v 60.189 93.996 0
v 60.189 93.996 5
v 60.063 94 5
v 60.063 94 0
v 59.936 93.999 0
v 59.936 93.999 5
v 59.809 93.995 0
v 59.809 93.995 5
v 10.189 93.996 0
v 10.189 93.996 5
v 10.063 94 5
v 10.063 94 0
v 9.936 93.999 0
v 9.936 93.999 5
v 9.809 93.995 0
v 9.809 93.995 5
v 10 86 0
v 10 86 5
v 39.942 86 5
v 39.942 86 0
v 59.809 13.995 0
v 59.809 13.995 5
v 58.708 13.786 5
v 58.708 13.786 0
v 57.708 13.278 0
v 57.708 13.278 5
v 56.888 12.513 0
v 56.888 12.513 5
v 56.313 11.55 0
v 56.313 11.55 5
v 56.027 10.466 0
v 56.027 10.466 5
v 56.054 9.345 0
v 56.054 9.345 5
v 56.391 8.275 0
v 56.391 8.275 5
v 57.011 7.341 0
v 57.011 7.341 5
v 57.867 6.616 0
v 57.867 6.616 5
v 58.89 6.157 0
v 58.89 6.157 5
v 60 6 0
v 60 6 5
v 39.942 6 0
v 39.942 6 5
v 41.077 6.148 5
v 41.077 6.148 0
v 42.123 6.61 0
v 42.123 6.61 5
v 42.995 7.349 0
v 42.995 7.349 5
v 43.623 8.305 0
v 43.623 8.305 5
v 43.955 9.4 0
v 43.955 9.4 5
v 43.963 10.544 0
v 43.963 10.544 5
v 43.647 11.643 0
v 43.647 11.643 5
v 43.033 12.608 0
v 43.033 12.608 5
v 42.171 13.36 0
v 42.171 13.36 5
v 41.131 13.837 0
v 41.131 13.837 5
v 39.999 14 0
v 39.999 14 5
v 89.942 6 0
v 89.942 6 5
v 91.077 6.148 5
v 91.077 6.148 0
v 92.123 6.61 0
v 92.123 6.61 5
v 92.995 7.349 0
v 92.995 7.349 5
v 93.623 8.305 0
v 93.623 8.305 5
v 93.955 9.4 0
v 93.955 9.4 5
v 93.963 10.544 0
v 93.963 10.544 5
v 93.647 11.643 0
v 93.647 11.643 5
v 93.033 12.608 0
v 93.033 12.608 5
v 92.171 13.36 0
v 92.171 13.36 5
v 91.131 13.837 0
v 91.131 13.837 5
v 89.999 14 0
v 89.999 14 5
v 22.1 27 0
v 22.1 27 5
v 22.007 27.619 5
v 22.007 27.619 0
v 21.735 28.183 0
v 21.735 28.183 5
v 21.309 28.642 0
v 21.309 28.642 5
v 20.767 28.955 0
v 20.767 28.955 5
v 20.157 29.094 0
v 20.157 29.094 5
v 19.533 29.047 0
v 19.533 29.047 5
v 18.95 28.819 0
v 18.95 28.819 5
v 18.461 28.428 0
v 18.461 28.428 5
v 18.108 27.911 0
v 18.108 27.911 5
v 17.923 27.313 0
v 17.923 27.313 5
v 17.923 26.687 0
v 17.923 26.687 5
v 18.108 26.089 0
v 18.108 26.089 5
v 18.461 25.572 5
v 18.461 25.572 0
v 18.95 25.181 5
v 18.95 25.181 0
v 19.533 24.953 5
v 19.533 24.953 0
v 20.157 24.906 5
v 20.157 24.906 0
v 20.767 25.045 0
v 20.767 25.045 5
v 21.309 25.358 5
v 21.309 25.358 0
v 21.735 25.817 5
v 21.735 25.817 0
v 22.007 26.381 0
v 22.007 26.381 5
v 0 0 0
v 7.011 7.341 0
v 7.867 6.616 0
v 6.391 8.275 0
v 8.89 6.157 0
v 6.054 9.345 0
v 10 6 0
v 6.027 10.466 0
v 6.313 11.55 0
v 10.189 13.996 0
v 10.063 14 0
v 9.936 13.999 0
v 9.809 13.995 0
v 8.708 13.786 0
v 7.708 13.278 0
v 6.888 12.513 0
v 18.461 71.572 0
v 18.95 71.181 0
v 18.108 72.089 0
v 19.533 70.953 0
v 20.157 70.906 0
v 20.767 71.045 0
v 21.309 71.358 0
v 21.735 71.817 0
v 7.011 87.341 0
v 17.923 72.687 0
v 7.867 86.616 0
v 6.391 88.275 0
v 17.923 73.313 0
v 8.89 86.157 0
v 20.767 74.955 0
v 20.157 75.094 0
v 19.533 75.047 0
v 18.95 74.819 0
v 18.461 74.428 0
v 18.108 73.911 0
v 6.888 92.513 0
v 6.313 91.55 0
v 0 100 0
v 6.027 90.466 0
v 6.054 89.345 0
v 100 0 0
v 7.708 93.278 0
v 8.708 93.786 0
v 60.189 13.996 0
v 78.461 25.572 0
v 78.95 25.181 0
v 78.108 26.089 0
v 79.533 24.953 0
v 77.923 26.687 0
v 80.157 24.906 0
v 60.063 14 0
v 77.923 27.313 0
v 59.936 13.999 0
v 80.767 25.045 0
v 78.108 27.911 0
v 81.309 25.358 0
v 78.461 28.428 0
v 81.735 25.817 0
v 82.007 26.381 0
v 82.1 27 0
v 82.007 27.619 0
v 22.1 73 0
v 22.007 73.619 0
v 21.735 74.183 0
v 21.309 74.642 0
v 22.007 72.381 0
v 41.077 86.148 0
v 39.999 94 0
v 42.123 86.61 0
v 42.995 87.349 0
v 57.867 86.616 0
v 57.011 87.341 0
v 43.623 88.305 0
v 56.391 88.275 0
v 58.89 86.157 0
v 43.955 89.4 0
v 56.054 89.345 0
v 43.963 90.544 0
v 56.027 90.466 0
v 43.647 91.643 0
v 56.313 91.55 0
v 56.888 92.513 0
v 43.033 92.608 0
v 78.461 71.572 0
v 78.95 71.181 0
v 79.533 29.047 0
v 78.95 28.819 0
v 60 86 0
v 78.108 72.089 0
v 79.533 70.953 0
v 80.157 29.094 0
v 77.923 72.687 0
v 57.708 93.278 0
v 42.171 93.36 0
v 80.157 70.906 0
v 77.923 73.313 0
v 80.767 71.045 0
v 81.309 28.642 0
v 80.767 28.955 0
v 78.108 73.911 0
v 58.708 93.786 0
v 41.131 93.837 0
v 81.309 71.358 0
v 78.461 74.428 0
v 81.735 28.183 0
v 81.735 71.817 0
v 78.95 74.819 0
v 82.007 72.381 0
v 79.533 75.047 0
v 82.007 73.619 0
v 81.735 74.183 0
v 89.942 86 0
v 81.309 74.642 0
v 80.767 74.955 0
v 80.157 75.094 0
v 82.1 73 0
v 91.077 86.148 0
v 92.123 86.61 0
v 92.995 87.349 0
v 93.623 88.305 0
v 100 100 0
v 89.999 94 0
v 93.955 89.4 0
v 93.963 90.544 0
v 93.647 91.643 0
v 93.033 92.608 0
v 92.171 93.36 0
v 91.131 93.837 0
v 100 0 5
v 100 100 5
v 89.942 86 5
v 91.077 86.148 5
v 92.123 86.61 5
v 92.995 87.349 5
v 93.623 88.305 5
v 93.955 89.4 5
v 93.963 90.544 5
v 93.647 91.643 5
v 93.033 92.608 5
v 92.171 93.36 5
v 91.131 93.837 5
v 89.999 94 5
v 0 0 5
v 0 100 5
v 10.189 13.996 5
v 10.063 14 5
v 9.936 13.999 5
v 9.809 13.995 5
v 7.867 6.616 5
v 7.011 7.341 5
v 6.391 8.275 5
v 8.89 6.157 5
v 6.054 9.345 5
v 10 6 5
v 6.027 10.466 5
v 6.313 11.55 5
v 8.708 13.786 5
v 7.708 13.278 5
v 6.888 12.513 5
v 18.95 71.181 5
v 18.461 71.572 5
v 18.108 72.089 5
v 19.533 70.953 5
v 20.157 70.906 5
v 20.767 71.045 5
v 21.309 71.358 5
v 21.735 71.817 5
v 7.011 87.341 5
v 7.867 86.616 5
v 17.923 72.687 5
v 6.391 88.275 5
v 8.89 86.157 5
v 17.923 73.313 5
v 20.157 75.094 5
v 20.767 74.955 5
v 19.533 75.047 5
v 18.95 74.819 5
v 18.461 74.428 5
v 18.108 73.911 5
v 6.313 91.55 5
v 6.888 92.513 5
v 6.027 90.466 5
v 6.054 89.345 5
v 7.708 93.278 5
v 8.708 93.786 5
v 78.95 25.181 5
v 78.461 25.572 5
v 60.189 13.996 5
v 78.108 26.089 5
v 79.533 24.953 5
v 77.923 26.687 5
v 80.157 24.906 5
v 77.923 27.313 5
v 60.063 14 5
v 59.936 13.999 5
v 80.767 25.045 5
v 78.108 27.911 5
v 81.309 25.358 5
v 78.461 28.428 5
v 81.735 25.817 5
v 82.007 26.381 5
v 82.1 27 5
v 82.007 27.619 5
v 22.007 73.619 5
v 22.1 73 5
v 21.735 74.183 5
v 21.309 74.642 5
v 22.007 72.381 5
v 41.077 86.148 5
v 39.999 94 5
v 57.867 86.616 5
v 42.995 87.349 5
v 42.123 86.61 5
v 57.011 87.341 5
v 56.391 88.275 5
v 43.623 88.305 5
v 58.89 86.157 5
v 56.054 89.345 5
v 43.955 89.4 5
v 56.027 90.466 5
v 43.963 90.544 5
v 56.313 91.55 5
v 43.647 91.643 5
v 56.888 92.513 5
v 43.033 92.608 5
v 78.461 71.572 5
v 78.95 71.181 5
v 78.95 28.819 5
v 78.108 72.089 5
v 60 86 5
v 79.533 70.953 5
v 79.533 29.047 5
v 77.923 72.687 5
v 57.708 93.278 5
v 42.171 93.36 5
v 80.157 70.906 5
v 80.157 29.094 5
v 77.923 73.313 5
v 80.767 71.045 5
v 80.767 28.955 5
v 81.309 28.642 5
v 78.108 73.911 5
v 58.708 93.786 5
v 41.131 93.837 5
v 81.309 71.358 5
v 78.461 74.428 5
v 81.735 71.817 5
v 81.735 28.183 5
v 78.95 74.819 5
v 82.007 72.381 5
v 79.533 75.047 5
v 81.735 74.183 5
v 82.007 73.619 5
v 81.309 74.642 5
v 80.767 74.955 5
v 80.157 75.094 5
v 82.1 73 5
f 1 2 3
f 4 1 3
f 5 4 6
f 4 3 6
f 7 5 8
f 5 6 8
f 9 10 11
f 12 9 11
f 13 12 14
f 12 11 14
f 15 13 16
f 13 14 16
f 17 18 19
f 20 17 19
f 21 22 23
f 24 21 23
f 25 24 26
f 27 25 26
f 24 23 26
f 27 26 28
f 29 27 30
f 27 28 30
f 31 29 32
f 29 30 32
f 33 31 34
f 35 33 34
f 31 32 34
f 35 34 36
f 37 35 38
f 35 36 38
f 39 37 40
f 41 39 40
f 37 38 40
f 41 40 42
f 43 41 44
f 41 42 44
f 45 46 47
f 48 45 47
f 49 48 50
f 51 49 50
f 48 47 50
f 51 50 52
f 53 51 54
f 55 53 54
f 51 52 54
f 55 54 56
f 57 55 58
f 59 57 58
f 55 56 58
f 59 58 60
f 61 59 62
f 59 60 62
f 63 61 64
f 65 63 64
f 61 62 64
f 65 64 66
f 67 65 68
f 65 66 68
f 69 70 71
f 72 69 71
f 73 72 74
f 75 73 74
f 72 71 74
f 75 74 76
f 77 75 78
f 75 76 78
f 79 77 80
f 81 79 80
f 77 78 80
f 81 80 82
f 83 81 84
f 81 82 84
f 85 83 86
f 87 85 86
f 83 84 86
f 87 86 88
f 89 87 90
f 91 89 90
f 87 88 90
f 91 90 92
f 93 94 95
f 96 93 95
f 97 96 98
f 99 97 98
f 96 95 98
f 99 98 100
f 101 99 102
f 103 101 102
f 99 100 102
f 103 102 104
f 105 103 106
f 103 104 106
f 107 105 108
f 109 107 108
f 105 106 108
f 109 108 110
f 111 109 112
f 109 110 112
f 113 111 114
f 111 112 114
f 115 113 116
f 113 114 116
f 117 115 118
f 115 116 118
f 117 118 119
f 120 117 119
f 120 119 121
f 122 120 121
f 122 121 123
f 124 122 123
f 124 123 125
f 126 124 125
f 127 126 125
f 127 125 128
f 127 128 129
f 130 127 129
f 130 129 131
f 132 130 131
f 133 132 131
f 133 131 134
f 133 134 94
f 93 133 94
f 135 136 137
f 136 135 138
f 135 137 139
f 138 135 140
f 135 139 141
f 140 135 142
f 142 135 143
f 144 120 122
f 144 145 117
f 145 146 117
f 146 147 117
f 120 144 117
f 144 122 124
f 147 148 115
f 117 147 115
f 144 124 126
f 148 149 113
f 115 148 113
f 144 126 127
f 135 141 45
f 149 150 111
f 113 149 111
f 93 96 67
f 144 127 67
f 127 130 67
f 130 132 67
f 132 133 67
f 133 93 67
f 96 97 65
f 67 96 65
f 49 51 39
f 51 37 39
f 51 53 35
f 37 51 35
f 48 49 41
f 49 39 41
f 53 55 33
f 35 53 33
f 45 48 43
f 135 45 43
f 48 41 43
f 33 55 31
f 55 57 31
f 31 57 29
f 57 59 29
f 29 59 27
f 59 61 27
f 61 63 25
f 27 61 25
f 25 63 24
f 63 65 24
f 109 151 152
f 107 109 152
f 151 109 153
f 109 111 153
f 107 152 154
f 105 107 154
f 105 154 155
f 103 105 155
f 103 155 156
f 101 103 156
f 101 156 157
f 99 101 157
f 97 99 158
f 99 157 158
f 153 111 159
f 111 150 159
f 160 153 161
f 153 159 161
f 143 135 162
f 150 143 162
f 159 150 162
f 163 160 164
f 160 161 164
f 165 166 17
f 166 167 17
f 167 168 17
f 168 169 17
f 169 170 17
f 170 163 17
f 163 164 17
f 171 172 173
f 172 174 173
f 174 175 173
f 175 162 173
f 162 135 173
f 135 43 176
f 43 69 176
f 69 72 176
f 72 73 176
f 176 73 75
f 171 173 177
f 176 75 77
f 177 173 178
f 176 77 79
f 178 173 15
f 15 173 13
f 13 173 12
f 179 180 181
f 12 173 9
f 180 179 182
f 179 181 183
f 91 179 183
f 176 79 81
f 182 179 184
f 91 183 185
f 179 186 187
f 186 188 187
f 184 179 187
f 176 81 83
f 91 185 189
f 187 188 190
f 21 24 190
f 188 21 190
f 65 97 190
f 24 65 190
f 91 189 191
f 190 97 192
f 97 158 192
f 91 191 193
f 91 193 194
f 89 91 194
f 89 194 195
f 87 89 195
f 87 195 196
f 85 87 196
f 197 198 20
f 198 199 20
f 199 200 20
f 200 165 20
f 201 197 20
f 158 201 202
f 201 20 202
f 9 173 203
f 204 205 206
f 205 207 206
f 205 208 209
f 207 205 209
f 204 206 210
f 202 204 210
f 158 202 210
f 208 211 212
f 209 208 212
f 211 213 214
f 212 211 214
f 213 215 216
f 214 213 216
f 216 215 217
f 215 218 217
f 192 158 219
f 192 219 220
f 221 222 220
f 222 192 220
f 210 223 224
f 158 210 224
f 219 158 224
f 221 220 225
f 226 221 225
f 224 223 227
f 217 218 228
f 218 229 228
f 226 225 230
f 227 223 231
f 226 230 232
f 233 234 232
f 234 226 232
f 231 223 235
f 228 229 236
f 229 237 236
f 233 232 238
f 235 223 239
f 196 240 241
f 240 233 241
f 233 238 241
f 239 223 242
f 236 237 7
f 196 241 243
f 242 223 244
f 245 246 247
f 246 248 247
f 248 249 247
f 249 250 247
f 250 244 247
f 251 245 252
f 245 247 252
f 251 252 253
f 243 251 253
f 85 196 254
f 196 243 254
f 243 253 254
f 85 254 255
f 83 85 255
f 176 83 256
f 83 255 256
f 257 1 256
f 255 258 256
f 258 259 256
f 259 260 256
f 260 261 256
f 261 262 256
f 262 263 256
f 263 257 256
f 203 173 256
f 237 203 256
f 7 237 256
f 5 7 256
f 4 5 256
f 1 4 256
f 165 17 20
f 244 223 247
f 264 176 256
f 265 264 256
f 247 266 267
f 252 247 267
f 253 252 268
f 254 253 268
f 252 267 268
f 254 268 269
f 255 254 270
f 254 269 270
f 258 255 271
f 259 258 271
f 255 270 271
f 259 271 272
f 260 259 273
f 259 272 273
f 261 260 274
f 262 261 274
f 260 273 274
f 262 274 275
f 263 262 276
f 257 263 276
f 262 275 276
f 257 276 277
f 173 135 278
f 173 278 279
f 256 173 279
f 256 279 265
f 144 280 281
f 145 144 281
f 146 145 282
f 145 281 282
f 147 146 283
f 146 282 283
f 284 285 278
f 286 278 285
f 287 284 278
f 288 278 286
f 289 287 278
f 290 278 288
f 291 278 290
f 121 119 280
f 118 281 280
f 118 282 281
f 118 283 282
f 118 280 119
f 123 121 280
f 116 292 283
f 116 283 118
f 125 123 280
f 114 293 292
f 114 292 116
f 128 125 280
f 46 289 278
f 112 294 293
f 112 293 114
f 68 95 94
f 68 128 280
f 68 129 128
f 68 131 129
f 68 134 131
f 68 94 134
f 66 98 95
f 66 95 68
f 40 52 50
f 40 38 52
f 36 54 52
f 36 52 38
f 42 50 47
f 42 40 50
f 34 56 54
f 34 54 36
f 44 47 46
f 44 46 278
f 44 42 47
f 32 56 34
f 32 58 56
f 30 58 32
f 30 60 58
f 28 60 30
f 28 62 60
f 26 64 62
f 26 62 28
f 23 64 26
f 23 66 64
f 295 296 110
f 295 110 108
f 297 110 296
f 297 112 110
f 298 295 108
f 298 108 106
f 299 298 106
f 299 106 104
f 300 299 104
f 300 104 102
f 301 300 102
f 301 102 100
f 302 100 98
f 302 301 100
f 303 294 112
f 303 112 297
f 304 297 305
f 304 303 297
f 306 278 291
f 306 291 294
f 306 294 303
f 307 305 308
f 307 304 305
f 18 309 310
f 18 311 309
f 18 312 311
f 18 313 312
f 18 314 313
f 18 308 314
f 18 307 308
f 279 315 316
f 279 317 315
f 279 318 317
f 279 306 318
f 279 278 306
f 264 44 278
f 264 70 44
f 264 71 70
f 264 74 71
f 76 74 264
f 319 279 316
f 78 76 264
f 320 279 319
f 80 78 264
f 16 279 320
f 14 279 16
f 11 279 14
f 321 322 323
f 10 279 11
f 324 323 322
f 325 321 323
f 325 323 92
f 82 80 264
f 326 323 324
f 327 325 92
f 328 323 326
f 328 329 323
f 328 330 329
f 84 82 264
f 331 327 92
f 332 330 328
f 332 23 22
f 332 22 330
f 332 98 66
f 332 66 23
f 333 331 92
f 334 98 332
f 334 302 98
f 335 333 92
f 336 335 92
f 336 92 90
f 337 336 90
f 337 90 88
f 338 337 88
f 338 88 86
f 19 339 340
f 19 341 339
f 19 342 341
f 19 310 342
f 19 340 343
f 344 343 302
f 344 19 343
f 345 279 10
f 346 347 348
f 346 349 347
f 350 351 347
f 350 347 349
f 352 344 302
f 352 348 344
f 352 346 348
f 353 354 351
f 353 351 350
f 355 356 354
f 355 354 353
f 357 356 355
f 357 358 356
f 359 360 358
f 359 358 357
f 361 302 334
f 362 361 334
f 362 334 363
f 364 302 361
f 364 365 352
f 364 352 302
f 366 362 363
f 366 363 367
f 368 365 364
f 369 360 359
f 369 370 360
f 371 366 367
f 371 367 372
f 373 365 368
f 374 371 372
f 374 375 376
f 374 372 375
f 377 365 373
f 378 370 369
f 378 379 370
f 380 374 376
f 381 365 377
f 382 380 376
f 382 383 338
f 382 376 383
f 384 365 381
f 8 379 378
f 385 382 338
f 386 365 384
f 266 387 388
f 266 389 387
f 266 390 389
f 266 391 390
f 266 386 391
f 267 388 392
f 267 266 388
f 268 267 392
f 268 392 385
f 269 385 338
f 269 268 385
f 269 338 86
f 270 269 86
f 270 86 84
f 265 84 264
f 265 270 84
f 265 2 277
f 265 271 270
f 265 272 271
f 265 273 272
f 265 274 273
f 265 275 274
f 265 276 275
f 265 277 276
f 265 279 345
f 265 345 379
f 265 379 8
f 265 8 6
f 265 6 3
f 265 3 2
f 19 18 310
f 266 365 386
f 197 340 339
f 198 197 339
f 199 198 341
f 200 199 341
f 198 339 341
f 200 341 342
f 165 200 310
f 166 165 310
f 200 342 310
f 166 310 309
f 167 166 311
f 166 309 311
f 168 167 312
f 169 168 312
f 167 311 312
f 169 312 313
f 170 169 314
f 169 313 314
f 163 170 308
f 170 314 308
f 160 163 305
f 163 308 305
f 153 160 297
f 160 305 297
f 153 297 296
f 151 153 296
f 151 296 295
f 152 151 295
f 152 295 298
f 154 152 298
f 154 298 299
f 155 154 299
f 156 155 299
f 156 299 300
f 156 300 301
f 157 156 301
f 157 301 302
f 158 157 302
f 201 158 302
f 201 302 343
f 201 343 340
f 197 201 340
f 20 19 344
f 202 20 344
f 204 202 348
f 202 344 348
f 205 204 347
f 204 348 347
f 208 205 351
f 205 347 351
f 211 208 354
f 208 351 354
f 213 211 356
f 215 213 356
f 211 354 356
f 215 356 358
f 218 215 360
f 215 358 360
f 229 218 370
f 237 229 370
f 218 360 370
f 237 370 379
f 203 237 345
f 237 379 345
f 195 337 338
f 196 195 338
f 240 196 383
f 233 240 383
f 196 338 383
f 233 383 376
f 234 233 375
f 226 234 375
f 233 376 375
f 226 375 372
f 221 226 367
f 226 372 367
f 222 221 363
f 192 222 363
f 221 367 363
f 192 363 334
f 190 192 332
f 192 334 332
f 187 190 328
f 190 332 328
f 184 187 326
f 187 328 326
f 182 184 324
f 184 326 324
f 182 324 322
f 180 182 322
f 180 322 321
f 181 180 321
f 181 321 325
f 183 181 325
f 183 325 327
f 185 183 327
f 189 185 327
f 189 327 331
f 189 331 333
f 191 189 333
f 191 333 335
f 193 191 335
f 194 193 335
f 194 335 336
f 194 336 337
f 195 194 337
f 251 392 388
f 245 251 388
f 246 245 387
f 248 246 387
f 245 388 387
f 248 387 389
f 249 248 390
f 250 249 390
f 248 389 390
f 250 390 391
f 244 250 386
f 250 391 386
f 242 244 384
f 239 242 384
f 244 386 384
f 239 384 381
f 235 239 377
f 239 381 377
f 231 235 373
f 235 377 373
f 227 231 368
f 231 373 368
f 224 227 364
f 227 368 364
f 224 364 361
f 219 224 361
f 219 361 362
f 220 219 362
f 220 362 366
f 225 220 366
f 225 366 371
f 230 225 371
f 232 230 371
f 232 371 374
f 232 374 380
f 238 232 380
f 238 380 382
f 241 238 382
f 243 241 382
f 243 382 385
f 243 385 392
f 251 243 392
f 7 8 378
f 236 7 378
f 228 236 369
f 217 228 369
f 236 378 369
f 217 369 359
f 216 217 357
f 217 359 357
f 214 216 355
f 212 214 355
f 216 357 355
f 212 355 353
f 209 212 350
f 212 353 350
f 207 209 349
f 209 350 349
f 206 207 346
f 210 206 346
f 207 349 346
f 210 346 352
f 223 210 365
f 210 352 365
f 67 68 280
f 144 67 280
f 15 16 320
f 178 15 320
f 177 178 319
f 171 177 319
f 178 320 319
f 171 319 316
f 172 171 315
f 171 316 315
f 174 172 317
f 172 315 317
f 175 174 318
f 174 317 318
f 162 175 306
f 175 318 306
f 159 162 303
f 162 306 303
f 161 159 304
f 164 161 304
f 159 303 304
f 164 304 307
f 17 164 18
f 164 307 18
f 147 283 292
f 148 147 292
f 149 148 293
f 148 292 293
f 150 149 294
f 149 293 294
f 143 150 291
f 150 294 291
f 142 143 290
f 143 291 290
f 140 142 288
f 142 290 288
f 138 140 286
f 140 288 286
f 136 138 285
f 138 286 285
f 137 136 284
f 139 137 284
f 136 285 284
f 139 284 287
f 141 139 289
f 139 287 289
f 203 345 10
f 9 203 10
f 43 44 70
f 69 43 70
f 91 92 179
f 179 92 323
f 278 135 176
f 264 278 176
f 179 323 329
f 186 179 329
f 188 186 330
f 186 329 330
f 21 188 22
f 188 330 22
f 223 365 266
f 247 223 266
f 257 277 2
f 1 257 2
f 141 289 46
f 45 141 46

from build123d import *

# Parameters (mm, degrees)
F0_W     = 100
F0_H     = 100
F1_DEPTH = 5
F3_DEPTH = 25
F4_R     = 2.1
F5_DEPTH = 25


with BuildPart() as f1:
    # F0 (on Top) → F1 (new body)
    with BuildSketch(Plane.XY):
        with Locations((50, 50)):
            Rectangle(F0_W, F0_H)
    extrude(amount=F1_DEPTH)

    # F2 (on face) → F3 (cut)
    with BuildSketch(Plane.XY.offset(5)):
        with BuildLine():
            Line((9.80931, 13.995452), (10.189486, 13.995509))
            ThreePointArc((10.189486, 13.995509), (9.999397, 14), (9.80931, 13.995452))
        make_face()
        with BuildLine():
            Line((39.999397, 14), (10.189486, 13.995509))
            Line((10.189486, 13.995509), (9.80931, 13.995452))
            ThreePointArc((9.80931, 13.995452), (6.001138, 9.9046), (10.000056, 6))
            Line((10.000056, 6), (39.942331, 6.000416))
            ThreePointArc((39.942331, 6.000416), (43.999898, 9.971466), (39.999397, 14))
        make_face()
        with BuildLine():
            Line((10.000056, 86), (39.942331, 86.000416))
            ThreePointArc((39.942331, 86.000416), (43.999898, 89.971466), (39.999397, 94))
            Line((39.999397, 94), (10.189486, 93.995509))
            Line((10.189486, 93.995509), (9.80931, 93.995452))
            ThreePointArc((9.80931, 93.995452), (6.001138, 89.9046), (10.000056, 86))
        make_face()
        with BuildLine():
            Line((9.80931, 93.995452), (10.189486, 93.995509))
            ThreePointArc((10.189486, 93.995509), (9.999397, 94), (9.80931, 93.995452))
        make_face()
        with BuildLine():
            Line((60.000056, 6), (89.942331, 6.000416))
            ThreePointArc((89.942331, 6.000416), (93.999898, 9.971466), (89.999397, 14))
            Line((89.999397, 14), (60.189486, 13.995509))
            Line((60.189486, 13.995509), (59.80931, 13.995452))
            ThreePointArc((59.80931, 13.995452), (56.001138, 9.9046), (60.000056, 6))
        make_face()
        with BuildLine():
            Line((59.80931, 13.995452), (60.189486, 13.995509))
            ThreePointArc((60.189486, 13.995509), (59.999397, 14), (59.80931, 13.995452))
        make_face()
        with BuildLine():
            Line((60.000056, 86), (89.942331, 86.000416))
            ThreePointArc((89.942331, 86.000416), (93.999898, 89.971466), (89.999397, 94))
            Line((89.999397, 94), (60.189486, 93.995509))
            Line((60.189486, 93.995509), (59.80931, 93.995452))
            ThreePointArc((59.80931, 93.995452), (56.001138, 89.9046), (60.000056, 86))
        make_face()
        with BuildLine():
            Line((59.80931, 93.995452), (60.189486, 93.995509))
            ThreePointArc((60.189486, 93.995509), (59.999397, 94), (59.80931, 93.995452))
        make_face()
    extrude(amount=-F3_DEPTH, mode=Mode.SUBTRACT)

    # F4 (on face) → F5 (cut)
    with BuildSketch(Plane.XY.offset(5)):
        with Locations((20, 73)):
            Circle(F4_R)
        with Locations((20, 27)):
            Circle(F4_R)
        with Locations((80, 27)):
            Circle(F4_R)
        with Locations((80, 73)):
            Circle(F4_R)
    extrude(amount=-F5_DEPTH, mode=Mode.SUBTRACT)


solid = f1.part
